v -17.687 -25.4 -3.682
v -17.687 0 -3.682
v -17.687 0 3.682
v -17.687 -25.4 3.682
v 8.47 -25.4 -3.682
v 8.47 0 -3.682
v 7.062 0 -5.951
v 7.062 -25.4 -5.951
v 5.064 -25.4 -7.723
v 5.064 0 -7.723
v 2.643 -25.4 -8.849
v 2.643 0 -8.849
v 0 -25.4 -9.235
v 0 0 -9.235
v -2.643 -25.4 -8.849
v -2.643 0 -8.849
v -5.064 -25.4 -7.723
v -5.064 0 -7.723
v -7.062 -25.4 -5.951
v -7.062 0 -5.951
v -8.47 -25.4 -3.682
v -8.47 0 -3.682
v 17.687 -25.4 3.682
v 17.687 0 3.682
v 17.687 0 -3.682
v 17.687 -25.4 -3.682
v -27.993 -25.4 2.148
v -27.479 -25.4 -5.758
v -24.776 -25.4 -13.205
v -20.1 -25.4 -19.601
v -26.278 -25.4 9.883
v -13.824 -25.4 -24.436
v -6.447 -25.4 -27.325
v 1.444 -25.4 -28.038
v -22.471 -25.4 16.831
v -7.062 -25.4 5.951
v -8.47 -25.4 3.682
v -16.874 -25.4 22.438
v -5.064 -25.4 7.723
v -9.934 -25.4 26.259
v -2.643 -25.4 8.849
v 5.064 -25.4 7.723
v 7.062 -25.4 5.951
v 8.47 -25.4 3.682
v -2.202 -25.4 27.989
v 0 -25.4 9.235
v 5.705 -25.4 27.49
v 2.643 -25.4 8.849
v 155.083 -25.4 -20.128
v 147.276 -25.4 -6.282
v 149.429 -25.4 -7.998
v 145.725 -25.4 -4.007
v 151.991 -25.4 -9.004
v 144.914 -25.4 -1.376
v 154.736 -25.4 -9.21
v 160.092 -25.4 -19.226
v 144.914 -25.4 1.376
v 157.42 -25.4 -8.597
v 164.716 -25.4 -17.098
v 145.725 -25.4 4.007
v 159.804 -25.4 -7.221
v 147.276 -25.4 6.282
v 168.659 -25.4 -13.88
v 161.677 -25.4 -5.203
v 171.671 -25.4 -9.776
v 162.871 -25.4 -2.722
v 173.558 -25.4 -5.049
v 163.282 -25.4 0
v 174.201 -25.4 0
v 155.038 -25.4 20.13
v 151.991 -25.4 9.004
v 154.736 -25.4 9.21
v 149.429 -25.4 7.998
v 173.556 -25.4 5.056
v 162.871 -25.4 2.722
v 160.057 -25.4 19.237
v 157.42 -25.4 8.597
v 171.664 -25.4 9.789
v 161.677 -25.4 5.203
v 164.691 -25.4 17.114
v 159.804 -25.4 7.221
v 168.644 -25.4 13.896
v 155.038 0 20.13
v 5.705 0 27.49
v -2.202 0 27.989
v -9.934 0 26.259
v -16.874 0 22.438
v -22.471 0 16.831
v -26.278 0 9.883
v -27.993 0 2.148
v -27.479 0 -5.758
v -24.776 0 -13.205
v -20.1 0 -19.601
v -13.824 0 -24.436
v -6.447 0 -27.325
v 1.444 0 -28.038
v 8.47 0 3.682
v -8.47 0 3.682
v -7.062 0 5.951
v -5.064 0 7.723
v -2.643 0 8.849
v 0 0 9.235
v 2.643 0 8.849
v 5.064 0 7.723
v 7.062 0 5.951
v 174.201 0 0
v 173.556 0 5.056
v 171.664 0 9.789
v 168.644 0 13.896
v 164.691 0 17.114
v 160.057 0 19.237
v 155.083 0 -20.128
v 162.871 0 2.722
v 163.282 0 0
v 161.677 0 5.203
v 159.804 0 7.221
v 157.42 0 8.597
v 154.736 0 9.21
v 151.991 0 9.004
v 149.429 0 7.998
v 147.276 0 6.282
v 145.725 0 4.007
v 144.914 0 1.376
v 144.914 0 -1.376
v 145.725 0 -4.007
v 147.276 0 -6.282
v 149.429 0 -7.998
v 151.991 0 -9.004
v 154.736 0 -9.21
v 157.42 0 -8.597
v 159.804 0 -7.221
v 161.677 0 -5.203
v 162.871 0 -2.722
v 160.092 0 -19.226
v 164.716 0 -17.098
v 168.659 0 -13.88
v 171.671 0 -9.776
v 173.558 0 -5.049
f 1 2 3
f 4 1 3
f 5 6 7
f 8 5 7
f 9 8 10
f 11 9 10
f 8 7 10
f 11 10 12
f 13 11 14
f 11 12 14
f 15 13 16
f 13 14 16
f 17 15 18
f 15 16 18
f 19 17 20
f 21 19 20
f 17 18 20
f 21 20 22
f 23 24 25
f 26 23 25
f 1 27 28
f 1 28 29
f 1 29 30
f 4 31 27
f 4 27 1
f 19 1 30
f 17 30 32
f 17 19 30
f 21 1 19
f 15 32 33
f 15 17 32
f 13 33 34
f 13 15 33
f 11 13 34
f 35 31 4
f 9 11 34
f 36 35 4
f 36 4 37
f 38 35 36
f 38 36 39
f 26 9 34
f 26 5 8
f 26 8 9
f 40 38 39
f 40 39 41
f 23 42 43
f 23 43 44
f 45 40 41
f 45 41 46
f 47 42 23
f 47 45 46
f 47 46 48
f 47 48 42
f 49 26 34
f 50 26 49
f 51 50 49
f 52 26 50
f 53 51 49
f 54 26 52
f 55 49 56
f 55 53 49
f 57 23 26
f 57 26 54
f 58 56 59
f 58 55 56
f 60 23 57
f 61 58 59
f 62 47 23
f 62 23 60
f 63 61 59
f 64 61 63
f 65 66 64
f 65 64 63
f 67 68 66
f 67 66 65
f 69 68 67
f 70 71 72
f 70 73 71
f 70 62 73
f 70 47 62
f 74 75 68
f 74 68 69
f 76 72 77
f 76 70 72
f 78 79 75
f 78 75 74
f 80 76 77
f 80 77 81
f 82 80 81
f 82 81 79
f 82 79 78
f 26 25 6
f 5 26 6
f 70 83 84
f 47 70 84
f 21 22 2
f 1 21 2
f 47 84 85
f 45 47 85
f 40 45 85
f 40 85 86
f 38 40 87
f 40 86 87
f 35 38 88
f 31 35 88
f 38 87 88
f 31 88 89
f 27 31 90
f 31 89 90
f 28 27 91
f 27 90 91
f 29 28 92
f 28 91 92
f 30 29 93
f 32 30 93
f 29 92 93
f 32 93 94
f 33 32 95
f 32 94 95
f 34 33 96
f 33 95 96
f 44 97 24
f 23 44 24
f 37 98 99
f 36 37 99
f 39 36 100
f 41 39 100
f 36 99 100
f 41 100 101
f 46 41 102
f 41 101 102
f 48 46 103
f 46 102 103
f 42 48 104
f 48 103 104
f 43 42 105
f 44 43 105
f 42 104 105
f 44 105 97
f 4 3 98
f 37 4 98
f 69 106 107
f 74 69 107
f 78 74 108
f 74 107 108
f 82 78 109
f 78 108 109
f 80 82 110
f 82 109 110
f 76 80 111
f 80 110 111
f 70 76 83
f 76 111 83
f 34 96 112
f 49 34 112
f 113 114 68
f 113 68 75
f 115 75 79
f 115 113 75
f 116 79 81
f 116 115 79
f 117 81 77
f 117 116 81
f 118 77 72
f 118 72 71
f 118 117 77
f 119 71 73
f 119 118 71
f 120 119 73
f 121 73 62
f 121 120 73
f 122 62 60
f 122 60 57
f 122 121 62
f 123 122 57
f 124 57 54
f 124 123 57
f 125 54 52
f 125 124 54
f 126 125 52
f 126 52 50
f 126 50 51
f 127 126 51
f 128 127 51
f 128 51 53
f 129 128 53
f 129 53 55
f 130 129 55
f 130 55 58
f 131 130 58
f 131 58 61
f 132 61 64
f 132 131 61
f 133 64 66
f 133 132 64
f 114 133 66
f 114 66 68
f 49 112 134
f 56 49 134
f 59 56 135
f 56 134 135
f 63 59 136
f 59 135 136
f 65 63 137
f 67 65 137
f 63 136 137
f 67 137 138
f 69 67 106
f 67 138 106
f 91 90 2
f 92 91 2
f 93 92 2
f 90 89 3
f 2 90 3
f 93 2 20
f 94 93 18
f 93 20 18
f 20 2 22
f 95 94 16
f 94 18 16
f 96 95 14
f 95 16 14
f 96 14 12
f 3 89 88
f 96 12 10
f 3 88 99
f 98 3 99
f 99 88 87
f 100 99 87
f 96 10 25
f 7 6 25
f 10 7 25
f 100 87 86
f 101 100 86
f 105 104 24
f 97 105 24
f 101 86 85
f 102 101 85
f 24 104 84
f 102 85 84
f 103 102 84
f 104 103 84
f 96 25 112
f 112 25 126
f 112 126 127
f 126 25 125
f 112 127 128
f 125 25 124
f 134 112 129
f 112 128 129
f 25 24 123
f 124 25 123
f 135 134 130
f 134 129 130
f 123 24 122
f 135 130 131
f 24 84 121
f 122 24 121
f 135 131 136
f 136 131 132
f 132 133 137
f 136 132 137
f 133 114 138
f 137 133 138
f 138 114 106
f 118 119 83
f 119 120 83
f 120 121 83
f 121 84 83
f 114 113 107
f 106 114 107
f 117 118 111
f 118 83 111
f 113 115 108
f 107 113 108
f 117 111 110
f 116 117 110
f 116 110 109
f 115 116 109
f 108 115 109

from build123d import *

# Parameters (mm, degrees)
F0_R     = 9.235468
F1_DEPTH = 25.4


with BuildPart() as f1:
    # F0 (on Front) → F1 (new body)
    with BuildSketch(Plane.XZ):
        with BuildLine():
            ThreePointArc((1.443592, -28.038119), (20.356194, -19.335083), (28.075257, 0))
            ThreePointArc((28.075257, 0), (21.77593, 17.720861), (5.704746, 27.489561))
            ThreePointArc((5.704746, 27.489561), (-27.992954, 2.148159), (1.443592, -28.038119))
        make_face()
        with BuildLine():
            ThreePointArc((-8.469817, 3.681855), (0, 9.235468), (8.469817, 3.681855))
            Line((8.469817, 3.681855), (17.686794, 3.681855))
            Line((17.686794, 3.681855), (17.686794, -3.681855))
            Line((17.686794, -3.681855), (8.469817, -3.681855))
            ThreePointArc((8.469817, -3.681855), (0, -9.235468), (-8.469817, -3.681855))
            Line((-8.469817, -3.681855), (-17.686794, -3.681855))
            Line((-17.686794, -3.681855), (-17.686794, 3.681855))
            Line((-17.686794, 3.681855), (-8.469817, 3.681855))
        make_face(mode=Mode.SUBTRACT)
        with BuildLine():
            ThreePointArc((5.704746, 27.489561), (21.77593, 17.720861), (28.075257, 0))
            ThreePointArc((28.075257, 0), (20.356194, -19.335083), (1.443592, -28.038119))
            Line((1.443592, -28.038119), (155.082565, -20.127745))
            ThreePointArc((155.082565, -20.127745), (133.891859, -0.022153), (155.038315, 20.129975))
            Line((155.038315, 20.129975), (5.704746, 27.489561))
        make_face()
        with BuildLine():
            ThreePointArc((174.200658, 0), (168.644103, 13.896144), (155.038315, 20.129975))
            ThreePointArc((155.038315, 20.129975), (133.891859, -0.022153), (155.082565, -20.127745))
            ThreePointArc((155.082565, -20.127745), (168.659369, -13.88009), (174.200658, 0))
        make_face()
        with Locations((154.046252, 0)):
            Circle(F0_R, mode=Mode.SUBTRACT)
    extrude(amount=F1_DEPTH)


solid = f1.part
